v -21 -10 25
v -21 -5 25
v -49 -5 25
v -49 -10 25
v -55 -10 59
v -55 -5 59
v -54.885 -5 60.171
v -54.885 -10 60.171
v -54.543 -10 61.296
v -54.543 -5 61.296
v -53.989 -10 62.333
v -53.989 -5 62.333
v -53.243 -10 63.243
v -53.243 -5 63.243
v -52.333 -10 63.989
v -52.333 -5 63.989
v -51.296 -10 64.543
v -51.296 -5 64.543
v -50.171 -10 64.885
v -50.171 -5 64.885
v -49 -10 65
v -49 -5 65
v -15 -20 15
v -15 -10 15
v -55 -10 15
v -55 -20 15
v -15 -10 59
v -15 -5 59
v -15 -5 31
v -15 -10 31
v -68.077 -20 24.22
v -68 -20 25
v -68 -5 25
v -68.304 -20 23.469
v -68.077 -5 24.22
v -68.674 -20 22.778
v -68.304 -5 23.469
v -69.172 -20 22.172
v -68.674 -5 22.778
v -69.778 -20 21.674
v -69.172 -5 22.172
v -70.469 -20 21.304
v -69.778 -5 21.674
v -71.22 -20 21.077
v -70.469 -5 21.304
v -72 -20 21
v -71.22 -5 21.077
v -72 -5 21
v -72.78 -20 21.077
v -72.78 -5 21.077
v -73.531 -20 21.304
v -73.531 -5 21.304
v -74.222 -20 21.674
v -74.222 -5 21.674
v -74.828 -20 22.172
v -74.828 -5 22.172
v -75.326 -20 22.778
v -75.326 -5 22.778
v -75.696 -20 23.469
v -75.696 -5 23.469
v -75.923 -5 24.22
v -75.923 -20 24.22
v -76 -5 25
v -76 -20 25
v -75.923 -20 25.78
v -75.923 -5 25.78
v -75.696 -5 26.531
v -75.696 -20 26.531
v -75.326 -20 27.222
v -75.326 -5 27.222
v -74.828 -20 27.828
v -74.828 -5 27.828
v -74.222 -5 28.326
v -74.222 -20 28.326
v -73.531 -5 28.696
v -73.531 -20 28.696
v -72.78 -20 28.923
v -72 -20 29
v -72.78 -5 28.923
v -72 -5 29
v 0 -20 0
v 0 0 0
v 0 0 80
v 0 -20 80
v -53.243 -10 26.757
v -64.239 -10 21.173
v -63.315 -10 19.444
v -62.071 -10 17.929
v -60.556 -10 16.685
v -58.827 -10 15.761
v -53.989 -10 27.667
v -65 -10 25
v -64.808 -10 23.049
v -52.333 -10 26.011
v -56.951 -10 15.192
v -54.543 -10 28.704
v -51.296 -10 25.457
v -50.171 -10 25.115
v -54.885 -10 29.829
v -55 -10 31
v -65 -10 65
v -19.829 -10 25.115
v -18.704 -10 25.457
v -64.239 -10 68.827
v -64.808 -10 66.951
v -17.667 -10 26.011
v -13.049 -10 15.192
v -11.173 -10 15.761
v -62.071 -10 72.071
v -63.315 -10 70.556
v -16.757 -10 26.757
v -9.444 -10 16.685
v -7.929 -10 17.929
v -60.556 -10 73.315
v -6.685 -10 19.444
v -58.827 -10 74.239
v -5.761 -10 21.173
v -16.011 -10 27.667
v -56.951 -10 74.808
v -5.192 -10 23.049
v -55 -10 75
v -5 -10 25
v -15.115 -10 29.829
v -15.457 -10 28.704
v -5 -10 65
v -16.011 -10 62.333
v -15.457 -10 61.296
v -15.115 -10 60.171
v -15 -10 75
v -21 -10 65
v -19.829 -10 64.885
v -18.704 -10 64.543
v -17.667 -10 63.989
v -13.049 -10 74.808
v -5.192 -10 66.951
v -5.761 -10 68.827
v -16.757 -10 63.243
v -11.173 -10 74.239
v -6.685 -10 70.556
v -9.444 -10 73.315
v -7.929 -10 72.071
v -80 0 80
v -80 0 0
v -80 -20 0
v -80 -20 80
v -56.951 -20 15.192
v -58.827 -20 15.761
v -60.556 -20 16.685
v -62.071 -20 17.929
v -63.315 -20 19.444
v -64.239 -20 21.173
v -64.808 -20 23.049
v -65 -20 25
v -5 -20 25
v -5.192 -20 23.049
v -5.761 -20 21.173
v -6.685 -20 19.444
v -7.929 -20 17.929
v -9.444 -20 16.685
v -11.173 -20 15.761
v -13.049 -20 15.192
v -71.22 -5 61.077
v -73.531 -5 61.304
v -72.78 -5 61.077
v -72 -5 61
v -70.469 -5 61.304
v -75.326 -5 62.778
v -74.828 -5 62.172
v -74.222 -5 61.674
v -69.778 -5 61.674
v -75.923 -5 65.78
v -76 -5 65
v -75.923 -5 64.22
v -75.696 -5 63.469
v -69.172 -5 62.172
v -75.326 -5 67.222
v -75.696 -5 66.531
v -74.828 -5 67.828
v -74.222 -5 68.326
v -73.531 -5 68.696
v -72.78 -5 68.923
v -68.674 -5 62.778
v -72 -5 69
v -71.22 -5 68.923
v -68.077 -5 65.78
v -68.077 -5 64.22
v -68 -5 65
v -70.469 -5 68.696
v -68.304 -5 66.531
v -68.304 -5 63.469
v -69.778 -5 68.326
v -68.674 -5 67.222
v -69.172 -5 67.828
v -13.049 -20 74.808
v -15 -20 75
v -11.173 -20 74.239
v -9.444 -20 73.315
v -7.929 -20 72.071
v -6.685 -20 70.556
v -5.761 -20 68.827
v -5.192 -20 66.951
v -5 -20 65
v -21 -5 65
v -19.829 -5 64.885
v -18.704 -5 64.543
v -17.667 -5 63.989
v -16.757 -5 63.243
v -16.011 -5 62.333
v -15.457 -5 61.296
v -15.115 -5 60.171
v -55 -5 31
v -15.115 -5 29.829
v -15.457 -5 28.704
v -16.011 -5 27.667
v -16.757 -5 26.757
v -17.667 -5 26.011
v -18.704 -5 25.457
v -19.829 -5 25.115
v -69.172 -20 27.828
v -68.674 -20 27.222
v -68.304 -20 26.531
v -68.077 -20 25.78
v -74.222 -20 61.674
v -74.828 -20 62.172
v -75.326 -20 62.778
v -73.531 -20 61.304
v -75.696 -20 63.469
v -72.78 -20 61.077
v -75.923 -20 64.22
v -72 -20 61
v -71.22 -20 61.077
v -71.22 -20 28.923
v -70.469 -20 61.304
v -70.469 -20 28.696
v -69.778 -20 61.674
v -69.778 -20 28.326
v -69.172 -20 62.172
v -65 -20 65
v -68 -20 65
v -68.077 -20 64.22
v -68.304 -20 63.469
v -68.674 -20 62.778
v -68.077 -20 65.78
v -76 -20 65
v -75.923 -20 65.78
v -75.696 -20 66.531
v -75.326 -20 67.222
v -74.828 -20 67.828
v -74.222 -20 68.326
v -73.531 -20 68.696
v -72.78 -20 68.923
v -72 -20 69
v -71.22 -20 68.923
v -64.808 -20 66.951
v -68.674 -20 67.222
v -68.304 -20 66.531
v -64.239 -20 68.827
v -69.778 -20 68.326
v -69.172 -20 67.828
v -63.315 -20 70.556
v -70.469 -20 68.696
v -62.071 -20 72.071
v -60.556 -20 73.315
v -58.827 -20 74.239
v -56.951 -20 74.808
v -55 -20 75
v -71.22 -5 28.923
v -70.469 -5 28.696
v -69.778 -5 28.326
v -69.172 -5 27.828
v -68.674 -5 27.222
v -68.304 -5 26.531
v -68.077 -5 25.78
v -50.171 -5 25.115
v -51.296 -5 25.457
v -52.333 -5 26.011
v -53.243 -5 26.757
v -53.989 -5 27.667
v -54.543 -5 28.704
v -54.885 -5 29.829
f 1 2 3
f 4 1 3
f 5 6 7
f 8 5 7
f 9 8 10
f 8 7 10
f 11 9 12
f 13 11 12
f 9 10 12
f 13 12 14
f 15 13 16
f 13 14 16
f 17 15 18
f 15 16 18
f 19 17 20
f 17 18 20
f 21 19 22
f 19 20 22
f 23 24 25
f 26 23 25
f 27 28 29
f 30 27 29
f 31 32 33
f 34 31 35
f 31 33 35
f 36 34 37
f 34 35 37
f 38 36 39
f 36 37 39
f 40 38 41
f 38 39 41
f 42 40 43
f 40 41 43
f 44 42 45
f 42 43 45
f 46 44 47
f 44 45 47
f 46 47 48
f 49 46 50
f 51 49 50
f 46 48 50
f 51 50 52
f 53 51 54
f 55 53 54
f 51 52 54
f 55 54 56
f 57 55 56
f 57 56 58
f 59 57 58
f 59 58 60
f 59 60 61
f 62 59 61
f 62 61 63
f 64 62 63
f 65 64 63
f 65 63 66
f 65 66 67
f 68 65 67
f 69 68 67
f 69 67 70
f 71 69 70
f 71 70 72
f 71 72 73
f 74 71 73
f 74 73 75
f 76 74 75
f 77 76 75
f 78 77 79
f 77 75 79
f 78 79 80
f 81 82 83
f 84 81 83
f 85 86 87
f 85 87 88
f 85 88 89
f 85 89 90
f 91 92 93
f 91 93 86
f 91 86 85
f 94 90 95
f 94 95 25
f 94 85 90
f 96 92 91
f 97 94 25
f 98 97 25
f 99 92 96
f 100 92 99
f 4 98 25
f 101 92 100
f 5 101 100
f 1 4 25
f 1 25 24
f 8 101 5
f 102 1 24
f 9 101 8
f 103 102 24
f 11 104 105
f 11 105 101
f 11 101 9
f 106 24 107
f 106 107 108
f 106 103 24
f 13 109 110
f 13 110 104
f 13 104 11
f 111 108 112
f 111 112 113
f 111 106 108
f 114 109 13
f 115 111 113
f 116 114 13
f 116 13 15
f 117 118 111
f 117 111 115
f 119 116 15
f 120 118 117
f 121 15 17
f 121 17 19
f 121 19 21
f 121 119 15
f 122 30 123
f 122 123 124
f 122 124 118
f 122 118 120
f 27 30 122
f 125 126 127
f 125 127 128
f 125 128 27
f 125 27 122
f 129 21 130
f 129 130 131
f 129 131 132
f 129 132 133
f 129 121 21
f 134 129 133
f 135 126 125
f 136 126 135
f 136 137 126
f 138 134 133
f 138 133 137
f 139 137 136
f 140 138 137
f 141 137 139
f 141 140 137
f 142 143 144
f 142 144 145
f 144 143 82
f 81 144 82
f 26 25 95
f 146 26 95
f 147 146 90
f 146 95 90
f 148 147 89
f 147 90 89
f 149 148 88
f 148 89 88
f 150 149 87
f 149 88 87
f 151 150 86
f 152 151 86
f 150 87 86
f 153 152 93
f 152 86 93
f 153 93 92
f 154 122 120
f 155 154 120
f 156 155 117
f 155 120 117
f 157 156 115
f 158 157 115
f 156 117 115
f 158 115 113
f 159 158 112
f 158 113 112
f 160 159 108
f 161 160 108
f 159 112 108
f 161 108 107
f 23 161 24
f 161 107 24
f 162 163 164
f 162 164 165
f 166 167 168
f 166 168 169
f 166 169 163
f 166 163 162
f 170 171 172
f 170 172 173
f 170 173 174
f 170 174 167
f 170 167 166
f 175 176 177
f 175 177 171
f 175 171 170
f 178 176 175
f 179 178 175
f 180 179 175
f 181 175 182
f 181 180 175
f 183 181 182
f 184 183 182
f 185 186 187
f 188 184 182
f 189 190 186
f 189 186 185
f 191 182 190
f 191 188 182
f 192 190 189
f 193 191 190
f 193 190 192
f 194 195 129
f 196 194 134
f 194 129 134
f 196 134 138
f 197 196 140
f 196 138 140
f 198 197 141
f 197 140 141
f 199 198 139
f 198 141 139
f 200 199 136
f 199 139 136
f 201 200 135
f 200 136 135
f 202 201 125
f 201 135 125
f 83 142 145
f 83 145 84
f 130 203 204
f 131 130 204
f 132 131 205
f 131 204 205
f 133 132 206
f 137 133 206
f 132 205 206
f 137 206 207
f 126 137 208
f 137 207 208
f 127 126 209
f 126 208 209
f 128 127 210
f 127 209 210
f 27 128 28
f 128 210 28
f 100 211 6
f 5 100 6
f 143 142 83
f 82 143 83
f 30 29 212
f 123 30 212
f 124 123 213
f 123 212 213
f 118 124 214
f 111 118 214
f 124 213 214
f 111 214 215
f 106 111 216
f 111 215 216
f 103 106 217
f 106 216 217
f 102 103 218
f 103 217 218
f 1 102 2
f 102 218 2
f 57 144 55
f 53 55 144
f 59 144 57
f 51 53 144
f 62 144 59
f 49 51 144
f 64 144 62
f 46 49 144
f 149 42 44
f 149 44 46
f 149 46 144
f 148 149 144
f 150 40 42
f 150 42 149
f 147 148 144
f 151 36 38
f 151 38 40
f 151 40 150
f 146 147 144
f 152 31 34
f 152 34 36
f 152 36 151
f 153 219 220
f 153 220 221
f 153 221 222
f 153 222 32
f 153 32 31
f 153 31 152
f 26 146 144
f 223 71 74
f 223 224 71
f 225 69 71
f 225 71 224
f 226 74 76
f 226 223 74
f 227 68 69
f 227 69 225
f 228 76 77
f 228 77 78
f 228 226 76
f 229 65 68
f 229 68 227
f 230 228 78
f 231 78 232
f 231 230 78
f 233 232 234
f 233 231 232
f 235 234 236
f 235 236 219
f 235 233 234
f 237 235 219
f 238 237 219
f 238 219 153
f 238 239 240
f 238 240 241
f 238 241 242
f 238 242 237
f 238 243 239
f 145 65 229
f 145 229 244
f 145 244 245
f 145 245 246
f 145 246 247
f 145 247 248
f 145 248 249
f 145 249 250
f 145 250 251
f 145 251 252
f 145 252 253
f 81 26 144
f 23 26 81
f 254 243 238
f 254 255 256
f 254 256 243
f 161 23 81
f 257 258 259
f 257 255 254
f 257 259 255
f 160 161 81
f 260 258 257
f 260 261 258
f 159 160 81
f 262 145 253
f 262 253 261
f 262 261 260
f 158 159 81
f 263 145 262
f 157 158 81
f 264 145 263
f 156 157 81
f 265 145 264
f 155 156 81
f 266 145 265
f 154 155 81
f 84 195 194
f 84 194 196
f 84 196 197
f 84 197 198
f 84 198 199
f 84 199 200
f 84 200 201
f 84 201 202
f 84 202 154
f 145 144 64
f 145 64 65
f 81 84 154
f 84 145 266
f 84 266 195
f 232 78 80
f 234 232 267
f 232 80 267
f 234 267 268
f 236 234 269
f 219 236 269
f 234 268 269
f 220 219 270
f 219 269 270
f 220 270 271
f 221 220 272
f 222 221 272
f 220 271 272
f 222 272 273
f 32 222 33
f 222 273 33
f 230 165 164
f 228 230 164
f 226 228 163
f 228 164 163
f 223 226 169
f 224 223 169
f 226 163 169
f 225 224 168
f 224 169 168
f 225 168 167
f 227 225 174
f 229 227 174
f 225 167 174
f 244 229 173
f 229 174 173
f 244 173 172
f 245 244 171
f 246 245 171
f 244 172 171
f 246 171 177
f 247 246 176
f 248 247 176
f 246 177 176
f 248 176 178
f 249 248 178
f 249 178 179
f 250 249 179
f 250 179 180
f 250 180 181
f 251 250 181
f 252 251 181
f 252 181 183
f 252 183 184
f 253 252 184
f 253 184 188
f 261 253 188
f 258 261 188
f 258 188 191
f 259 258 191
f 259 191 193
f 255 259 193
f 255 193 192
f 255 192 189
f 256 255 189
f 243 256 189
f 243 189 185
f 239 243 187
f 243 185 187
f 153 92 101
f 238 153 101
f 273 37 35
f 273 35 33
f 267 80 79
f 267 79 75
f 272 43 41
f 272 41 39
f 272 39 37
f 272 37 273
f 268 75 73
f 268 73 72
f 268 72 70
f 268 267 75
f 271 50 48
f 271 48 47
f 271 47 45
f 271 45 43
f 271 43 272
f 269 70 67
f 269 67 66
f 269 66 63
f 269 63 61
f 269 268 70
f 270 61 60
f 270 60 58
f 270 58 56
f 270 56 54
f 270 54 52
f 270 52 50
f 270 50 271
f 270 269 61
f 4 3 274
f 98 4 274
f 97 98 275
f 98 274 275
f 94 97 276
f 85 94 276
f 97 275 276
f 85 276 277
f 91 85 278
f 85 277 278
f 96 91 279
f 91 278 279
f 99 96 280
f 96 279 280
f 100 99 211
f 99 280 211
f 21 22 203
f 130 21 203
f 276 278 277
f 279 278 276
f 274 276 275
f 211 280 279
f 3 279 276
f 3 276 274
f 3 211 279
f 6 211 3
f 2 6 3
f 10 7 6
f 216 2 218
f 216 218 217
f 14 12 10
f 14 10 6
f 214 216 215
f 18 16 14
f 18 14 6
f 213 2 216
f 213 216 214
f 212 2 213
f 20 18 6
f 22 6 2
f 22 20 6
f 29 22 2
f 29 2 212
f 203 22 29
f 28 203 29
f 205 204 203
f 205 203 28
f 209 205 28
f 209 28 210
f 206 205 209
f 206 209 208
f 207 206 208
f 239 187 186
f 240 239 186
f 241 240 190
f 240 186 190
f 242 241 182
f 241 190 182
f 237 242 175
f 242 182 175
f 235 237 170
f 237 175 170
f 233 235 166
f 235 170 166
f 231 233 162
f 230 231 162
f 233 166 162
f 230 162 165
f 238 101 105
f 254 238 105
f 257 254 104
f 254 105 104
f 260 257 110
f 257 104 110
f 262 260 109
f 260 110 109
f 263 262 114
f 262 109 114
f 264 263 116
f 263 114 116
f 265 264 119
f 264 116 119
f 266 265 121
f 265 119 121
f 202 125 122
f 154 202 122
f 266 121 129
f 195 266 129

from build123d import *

# Parameters (mm, degrees)
F1_DEPTH = 5
F2_DEPTH = 10
F0_W     = 80
F0_H     = 80
F3_DEPTH = 20
F4_DEPTH = 5


with BuildPart() as f1:
    # F0 (on Front) → F1 (new body)
    with BuildSketch(Plane.XZ):
        with BuildLine():
            Line((-21, 65), (-49, 65))
            ThreePointArc((-49, 65), (-53.242641, 63.242641), (-55, 59))
            Line((-55, 59), (-55, 31))
            ThreePointArc((-55, 31), (-53.242641, 26.757359), (-49, 25))
            Line((-49, 25), (-21, 25))
            ThreePointArc((-21, 25), (-16.757359, 26.757359), (-15, 31))
            Line((-15, 31), (-15, 59))
            ThreePointArc((-15, 59), (-16.757359, 63.242641), (-21, 65))
        make_face()
    extrude(amount=F1_DEPTH)

    # F0 (on Front) → F2 (join)
    with BuildSketch(Plane.XZ):
        with BuildLine():
            Line((-15, 75), (-55, 75))
            ThreePointArc((-55, 75), (-62.071068, 72.071068), (-65, 65))
            Line((-65, 65), (-65, 25))
            ThreePointArc((-65, 25), (-62.071068, 17.928932), (-55, 15))
            Line((-55, 15), (-15, 15))
            ThreePointArc((-15, 15), (-7.928932, 17.928932), (-5, 25))
            Line((-5, 25), (-5, 65))
            ThreePointArc((-5, 65), (-7.928932, 72.071068), (-15, 75))
        make_face()
        with BuildLine():
            ThreePointArc((-55, 59), (-53.242641, 63.242641), (-49, 65))
            Line((-49, 65), (-21, 65))
            ThreePointArc((-21, 65), (-16.757359, 63.242641), (-15, 59))
            Line((-15, 59), (-15, 31))
            ThreePointArc((-15, 31), (-16.757359, 26.757359), (-21, 25))
            Line((-21, 25), (-49, 25))
            ThreePointArc((-49, 25), (-53.242641, 26.757359), (-55, 31))
            Line((-55, 31), (-55, 59))
        make_face(mode=Mode.SUBTRACT)
    extrude(amount=F2_DEPTH)

    # F0 (on Front) → F3 (join)
    with BuildSketch(Plane.XZ):
        with Locations((-40, 40)):
            Rectangle(F0_W, F0_H)
        with BuildLine():
            ThreePointArc((-68, 25), (-74.828427, 22.171573), (-72, 29))
            ThreePointArc((-72, 29), (-69.171573, 27.828427), (-68, 25))
        make_face(mode=Mode.SUBTRACT)
        with BuildLine():
            ThreePointArc((-72, 61), (-74.828427, 67.828427), (-68, 65))
            ThreePointArc((-68, 65), (-69.171573, 62.171573), (-72, 61))
        make_face(mode=Mode.SUBTRACT)
        with BuildLine():
            ThreePointArc((-65, 65), (-62.071068, 72.071068), (-55, 75))
            Line((-55, 75), (-15, 75))
            ThreePointArc((-15, 75), (-7.928932, 72.071068), (-5, 65))
            Line((-5, 65), (-5, 25))
            ThreePointArc((-5, 25), (-7.928932, 17.928932), (-15, 15))
            Line((-15, 15), (-55, 15))
            ThreePointArc((-55, 15), (-62.071068, 17.928932), (-65, 25))
            Line((-65, 25), (-65, 65))
        make_face(mode=Mode.SUBTRACT)
    extrude(amount=F3_DEPTH)

    # F0 (on Front) → F4 (join)
    with BuildSketch(Plane.XZ):
        with BuildLine():
            ThreePointArc((-72, 61), (-69.171573, 62.171573), (-68, 65))
            ThreePointArc((-68, 65), (-74.828427, 67.828427), (-72, 61))
        make_face()
        with BuildLine():
            ThreePointArc((-68, 25), (-69.171573, 27.828427), (-72, 29))
            ThreePointArc((-72, 29), (-74.828427, 22.171573), (-68, 25))
        make_face()
    extrude(amount=F4_DEPTH)


solid = f1.part
